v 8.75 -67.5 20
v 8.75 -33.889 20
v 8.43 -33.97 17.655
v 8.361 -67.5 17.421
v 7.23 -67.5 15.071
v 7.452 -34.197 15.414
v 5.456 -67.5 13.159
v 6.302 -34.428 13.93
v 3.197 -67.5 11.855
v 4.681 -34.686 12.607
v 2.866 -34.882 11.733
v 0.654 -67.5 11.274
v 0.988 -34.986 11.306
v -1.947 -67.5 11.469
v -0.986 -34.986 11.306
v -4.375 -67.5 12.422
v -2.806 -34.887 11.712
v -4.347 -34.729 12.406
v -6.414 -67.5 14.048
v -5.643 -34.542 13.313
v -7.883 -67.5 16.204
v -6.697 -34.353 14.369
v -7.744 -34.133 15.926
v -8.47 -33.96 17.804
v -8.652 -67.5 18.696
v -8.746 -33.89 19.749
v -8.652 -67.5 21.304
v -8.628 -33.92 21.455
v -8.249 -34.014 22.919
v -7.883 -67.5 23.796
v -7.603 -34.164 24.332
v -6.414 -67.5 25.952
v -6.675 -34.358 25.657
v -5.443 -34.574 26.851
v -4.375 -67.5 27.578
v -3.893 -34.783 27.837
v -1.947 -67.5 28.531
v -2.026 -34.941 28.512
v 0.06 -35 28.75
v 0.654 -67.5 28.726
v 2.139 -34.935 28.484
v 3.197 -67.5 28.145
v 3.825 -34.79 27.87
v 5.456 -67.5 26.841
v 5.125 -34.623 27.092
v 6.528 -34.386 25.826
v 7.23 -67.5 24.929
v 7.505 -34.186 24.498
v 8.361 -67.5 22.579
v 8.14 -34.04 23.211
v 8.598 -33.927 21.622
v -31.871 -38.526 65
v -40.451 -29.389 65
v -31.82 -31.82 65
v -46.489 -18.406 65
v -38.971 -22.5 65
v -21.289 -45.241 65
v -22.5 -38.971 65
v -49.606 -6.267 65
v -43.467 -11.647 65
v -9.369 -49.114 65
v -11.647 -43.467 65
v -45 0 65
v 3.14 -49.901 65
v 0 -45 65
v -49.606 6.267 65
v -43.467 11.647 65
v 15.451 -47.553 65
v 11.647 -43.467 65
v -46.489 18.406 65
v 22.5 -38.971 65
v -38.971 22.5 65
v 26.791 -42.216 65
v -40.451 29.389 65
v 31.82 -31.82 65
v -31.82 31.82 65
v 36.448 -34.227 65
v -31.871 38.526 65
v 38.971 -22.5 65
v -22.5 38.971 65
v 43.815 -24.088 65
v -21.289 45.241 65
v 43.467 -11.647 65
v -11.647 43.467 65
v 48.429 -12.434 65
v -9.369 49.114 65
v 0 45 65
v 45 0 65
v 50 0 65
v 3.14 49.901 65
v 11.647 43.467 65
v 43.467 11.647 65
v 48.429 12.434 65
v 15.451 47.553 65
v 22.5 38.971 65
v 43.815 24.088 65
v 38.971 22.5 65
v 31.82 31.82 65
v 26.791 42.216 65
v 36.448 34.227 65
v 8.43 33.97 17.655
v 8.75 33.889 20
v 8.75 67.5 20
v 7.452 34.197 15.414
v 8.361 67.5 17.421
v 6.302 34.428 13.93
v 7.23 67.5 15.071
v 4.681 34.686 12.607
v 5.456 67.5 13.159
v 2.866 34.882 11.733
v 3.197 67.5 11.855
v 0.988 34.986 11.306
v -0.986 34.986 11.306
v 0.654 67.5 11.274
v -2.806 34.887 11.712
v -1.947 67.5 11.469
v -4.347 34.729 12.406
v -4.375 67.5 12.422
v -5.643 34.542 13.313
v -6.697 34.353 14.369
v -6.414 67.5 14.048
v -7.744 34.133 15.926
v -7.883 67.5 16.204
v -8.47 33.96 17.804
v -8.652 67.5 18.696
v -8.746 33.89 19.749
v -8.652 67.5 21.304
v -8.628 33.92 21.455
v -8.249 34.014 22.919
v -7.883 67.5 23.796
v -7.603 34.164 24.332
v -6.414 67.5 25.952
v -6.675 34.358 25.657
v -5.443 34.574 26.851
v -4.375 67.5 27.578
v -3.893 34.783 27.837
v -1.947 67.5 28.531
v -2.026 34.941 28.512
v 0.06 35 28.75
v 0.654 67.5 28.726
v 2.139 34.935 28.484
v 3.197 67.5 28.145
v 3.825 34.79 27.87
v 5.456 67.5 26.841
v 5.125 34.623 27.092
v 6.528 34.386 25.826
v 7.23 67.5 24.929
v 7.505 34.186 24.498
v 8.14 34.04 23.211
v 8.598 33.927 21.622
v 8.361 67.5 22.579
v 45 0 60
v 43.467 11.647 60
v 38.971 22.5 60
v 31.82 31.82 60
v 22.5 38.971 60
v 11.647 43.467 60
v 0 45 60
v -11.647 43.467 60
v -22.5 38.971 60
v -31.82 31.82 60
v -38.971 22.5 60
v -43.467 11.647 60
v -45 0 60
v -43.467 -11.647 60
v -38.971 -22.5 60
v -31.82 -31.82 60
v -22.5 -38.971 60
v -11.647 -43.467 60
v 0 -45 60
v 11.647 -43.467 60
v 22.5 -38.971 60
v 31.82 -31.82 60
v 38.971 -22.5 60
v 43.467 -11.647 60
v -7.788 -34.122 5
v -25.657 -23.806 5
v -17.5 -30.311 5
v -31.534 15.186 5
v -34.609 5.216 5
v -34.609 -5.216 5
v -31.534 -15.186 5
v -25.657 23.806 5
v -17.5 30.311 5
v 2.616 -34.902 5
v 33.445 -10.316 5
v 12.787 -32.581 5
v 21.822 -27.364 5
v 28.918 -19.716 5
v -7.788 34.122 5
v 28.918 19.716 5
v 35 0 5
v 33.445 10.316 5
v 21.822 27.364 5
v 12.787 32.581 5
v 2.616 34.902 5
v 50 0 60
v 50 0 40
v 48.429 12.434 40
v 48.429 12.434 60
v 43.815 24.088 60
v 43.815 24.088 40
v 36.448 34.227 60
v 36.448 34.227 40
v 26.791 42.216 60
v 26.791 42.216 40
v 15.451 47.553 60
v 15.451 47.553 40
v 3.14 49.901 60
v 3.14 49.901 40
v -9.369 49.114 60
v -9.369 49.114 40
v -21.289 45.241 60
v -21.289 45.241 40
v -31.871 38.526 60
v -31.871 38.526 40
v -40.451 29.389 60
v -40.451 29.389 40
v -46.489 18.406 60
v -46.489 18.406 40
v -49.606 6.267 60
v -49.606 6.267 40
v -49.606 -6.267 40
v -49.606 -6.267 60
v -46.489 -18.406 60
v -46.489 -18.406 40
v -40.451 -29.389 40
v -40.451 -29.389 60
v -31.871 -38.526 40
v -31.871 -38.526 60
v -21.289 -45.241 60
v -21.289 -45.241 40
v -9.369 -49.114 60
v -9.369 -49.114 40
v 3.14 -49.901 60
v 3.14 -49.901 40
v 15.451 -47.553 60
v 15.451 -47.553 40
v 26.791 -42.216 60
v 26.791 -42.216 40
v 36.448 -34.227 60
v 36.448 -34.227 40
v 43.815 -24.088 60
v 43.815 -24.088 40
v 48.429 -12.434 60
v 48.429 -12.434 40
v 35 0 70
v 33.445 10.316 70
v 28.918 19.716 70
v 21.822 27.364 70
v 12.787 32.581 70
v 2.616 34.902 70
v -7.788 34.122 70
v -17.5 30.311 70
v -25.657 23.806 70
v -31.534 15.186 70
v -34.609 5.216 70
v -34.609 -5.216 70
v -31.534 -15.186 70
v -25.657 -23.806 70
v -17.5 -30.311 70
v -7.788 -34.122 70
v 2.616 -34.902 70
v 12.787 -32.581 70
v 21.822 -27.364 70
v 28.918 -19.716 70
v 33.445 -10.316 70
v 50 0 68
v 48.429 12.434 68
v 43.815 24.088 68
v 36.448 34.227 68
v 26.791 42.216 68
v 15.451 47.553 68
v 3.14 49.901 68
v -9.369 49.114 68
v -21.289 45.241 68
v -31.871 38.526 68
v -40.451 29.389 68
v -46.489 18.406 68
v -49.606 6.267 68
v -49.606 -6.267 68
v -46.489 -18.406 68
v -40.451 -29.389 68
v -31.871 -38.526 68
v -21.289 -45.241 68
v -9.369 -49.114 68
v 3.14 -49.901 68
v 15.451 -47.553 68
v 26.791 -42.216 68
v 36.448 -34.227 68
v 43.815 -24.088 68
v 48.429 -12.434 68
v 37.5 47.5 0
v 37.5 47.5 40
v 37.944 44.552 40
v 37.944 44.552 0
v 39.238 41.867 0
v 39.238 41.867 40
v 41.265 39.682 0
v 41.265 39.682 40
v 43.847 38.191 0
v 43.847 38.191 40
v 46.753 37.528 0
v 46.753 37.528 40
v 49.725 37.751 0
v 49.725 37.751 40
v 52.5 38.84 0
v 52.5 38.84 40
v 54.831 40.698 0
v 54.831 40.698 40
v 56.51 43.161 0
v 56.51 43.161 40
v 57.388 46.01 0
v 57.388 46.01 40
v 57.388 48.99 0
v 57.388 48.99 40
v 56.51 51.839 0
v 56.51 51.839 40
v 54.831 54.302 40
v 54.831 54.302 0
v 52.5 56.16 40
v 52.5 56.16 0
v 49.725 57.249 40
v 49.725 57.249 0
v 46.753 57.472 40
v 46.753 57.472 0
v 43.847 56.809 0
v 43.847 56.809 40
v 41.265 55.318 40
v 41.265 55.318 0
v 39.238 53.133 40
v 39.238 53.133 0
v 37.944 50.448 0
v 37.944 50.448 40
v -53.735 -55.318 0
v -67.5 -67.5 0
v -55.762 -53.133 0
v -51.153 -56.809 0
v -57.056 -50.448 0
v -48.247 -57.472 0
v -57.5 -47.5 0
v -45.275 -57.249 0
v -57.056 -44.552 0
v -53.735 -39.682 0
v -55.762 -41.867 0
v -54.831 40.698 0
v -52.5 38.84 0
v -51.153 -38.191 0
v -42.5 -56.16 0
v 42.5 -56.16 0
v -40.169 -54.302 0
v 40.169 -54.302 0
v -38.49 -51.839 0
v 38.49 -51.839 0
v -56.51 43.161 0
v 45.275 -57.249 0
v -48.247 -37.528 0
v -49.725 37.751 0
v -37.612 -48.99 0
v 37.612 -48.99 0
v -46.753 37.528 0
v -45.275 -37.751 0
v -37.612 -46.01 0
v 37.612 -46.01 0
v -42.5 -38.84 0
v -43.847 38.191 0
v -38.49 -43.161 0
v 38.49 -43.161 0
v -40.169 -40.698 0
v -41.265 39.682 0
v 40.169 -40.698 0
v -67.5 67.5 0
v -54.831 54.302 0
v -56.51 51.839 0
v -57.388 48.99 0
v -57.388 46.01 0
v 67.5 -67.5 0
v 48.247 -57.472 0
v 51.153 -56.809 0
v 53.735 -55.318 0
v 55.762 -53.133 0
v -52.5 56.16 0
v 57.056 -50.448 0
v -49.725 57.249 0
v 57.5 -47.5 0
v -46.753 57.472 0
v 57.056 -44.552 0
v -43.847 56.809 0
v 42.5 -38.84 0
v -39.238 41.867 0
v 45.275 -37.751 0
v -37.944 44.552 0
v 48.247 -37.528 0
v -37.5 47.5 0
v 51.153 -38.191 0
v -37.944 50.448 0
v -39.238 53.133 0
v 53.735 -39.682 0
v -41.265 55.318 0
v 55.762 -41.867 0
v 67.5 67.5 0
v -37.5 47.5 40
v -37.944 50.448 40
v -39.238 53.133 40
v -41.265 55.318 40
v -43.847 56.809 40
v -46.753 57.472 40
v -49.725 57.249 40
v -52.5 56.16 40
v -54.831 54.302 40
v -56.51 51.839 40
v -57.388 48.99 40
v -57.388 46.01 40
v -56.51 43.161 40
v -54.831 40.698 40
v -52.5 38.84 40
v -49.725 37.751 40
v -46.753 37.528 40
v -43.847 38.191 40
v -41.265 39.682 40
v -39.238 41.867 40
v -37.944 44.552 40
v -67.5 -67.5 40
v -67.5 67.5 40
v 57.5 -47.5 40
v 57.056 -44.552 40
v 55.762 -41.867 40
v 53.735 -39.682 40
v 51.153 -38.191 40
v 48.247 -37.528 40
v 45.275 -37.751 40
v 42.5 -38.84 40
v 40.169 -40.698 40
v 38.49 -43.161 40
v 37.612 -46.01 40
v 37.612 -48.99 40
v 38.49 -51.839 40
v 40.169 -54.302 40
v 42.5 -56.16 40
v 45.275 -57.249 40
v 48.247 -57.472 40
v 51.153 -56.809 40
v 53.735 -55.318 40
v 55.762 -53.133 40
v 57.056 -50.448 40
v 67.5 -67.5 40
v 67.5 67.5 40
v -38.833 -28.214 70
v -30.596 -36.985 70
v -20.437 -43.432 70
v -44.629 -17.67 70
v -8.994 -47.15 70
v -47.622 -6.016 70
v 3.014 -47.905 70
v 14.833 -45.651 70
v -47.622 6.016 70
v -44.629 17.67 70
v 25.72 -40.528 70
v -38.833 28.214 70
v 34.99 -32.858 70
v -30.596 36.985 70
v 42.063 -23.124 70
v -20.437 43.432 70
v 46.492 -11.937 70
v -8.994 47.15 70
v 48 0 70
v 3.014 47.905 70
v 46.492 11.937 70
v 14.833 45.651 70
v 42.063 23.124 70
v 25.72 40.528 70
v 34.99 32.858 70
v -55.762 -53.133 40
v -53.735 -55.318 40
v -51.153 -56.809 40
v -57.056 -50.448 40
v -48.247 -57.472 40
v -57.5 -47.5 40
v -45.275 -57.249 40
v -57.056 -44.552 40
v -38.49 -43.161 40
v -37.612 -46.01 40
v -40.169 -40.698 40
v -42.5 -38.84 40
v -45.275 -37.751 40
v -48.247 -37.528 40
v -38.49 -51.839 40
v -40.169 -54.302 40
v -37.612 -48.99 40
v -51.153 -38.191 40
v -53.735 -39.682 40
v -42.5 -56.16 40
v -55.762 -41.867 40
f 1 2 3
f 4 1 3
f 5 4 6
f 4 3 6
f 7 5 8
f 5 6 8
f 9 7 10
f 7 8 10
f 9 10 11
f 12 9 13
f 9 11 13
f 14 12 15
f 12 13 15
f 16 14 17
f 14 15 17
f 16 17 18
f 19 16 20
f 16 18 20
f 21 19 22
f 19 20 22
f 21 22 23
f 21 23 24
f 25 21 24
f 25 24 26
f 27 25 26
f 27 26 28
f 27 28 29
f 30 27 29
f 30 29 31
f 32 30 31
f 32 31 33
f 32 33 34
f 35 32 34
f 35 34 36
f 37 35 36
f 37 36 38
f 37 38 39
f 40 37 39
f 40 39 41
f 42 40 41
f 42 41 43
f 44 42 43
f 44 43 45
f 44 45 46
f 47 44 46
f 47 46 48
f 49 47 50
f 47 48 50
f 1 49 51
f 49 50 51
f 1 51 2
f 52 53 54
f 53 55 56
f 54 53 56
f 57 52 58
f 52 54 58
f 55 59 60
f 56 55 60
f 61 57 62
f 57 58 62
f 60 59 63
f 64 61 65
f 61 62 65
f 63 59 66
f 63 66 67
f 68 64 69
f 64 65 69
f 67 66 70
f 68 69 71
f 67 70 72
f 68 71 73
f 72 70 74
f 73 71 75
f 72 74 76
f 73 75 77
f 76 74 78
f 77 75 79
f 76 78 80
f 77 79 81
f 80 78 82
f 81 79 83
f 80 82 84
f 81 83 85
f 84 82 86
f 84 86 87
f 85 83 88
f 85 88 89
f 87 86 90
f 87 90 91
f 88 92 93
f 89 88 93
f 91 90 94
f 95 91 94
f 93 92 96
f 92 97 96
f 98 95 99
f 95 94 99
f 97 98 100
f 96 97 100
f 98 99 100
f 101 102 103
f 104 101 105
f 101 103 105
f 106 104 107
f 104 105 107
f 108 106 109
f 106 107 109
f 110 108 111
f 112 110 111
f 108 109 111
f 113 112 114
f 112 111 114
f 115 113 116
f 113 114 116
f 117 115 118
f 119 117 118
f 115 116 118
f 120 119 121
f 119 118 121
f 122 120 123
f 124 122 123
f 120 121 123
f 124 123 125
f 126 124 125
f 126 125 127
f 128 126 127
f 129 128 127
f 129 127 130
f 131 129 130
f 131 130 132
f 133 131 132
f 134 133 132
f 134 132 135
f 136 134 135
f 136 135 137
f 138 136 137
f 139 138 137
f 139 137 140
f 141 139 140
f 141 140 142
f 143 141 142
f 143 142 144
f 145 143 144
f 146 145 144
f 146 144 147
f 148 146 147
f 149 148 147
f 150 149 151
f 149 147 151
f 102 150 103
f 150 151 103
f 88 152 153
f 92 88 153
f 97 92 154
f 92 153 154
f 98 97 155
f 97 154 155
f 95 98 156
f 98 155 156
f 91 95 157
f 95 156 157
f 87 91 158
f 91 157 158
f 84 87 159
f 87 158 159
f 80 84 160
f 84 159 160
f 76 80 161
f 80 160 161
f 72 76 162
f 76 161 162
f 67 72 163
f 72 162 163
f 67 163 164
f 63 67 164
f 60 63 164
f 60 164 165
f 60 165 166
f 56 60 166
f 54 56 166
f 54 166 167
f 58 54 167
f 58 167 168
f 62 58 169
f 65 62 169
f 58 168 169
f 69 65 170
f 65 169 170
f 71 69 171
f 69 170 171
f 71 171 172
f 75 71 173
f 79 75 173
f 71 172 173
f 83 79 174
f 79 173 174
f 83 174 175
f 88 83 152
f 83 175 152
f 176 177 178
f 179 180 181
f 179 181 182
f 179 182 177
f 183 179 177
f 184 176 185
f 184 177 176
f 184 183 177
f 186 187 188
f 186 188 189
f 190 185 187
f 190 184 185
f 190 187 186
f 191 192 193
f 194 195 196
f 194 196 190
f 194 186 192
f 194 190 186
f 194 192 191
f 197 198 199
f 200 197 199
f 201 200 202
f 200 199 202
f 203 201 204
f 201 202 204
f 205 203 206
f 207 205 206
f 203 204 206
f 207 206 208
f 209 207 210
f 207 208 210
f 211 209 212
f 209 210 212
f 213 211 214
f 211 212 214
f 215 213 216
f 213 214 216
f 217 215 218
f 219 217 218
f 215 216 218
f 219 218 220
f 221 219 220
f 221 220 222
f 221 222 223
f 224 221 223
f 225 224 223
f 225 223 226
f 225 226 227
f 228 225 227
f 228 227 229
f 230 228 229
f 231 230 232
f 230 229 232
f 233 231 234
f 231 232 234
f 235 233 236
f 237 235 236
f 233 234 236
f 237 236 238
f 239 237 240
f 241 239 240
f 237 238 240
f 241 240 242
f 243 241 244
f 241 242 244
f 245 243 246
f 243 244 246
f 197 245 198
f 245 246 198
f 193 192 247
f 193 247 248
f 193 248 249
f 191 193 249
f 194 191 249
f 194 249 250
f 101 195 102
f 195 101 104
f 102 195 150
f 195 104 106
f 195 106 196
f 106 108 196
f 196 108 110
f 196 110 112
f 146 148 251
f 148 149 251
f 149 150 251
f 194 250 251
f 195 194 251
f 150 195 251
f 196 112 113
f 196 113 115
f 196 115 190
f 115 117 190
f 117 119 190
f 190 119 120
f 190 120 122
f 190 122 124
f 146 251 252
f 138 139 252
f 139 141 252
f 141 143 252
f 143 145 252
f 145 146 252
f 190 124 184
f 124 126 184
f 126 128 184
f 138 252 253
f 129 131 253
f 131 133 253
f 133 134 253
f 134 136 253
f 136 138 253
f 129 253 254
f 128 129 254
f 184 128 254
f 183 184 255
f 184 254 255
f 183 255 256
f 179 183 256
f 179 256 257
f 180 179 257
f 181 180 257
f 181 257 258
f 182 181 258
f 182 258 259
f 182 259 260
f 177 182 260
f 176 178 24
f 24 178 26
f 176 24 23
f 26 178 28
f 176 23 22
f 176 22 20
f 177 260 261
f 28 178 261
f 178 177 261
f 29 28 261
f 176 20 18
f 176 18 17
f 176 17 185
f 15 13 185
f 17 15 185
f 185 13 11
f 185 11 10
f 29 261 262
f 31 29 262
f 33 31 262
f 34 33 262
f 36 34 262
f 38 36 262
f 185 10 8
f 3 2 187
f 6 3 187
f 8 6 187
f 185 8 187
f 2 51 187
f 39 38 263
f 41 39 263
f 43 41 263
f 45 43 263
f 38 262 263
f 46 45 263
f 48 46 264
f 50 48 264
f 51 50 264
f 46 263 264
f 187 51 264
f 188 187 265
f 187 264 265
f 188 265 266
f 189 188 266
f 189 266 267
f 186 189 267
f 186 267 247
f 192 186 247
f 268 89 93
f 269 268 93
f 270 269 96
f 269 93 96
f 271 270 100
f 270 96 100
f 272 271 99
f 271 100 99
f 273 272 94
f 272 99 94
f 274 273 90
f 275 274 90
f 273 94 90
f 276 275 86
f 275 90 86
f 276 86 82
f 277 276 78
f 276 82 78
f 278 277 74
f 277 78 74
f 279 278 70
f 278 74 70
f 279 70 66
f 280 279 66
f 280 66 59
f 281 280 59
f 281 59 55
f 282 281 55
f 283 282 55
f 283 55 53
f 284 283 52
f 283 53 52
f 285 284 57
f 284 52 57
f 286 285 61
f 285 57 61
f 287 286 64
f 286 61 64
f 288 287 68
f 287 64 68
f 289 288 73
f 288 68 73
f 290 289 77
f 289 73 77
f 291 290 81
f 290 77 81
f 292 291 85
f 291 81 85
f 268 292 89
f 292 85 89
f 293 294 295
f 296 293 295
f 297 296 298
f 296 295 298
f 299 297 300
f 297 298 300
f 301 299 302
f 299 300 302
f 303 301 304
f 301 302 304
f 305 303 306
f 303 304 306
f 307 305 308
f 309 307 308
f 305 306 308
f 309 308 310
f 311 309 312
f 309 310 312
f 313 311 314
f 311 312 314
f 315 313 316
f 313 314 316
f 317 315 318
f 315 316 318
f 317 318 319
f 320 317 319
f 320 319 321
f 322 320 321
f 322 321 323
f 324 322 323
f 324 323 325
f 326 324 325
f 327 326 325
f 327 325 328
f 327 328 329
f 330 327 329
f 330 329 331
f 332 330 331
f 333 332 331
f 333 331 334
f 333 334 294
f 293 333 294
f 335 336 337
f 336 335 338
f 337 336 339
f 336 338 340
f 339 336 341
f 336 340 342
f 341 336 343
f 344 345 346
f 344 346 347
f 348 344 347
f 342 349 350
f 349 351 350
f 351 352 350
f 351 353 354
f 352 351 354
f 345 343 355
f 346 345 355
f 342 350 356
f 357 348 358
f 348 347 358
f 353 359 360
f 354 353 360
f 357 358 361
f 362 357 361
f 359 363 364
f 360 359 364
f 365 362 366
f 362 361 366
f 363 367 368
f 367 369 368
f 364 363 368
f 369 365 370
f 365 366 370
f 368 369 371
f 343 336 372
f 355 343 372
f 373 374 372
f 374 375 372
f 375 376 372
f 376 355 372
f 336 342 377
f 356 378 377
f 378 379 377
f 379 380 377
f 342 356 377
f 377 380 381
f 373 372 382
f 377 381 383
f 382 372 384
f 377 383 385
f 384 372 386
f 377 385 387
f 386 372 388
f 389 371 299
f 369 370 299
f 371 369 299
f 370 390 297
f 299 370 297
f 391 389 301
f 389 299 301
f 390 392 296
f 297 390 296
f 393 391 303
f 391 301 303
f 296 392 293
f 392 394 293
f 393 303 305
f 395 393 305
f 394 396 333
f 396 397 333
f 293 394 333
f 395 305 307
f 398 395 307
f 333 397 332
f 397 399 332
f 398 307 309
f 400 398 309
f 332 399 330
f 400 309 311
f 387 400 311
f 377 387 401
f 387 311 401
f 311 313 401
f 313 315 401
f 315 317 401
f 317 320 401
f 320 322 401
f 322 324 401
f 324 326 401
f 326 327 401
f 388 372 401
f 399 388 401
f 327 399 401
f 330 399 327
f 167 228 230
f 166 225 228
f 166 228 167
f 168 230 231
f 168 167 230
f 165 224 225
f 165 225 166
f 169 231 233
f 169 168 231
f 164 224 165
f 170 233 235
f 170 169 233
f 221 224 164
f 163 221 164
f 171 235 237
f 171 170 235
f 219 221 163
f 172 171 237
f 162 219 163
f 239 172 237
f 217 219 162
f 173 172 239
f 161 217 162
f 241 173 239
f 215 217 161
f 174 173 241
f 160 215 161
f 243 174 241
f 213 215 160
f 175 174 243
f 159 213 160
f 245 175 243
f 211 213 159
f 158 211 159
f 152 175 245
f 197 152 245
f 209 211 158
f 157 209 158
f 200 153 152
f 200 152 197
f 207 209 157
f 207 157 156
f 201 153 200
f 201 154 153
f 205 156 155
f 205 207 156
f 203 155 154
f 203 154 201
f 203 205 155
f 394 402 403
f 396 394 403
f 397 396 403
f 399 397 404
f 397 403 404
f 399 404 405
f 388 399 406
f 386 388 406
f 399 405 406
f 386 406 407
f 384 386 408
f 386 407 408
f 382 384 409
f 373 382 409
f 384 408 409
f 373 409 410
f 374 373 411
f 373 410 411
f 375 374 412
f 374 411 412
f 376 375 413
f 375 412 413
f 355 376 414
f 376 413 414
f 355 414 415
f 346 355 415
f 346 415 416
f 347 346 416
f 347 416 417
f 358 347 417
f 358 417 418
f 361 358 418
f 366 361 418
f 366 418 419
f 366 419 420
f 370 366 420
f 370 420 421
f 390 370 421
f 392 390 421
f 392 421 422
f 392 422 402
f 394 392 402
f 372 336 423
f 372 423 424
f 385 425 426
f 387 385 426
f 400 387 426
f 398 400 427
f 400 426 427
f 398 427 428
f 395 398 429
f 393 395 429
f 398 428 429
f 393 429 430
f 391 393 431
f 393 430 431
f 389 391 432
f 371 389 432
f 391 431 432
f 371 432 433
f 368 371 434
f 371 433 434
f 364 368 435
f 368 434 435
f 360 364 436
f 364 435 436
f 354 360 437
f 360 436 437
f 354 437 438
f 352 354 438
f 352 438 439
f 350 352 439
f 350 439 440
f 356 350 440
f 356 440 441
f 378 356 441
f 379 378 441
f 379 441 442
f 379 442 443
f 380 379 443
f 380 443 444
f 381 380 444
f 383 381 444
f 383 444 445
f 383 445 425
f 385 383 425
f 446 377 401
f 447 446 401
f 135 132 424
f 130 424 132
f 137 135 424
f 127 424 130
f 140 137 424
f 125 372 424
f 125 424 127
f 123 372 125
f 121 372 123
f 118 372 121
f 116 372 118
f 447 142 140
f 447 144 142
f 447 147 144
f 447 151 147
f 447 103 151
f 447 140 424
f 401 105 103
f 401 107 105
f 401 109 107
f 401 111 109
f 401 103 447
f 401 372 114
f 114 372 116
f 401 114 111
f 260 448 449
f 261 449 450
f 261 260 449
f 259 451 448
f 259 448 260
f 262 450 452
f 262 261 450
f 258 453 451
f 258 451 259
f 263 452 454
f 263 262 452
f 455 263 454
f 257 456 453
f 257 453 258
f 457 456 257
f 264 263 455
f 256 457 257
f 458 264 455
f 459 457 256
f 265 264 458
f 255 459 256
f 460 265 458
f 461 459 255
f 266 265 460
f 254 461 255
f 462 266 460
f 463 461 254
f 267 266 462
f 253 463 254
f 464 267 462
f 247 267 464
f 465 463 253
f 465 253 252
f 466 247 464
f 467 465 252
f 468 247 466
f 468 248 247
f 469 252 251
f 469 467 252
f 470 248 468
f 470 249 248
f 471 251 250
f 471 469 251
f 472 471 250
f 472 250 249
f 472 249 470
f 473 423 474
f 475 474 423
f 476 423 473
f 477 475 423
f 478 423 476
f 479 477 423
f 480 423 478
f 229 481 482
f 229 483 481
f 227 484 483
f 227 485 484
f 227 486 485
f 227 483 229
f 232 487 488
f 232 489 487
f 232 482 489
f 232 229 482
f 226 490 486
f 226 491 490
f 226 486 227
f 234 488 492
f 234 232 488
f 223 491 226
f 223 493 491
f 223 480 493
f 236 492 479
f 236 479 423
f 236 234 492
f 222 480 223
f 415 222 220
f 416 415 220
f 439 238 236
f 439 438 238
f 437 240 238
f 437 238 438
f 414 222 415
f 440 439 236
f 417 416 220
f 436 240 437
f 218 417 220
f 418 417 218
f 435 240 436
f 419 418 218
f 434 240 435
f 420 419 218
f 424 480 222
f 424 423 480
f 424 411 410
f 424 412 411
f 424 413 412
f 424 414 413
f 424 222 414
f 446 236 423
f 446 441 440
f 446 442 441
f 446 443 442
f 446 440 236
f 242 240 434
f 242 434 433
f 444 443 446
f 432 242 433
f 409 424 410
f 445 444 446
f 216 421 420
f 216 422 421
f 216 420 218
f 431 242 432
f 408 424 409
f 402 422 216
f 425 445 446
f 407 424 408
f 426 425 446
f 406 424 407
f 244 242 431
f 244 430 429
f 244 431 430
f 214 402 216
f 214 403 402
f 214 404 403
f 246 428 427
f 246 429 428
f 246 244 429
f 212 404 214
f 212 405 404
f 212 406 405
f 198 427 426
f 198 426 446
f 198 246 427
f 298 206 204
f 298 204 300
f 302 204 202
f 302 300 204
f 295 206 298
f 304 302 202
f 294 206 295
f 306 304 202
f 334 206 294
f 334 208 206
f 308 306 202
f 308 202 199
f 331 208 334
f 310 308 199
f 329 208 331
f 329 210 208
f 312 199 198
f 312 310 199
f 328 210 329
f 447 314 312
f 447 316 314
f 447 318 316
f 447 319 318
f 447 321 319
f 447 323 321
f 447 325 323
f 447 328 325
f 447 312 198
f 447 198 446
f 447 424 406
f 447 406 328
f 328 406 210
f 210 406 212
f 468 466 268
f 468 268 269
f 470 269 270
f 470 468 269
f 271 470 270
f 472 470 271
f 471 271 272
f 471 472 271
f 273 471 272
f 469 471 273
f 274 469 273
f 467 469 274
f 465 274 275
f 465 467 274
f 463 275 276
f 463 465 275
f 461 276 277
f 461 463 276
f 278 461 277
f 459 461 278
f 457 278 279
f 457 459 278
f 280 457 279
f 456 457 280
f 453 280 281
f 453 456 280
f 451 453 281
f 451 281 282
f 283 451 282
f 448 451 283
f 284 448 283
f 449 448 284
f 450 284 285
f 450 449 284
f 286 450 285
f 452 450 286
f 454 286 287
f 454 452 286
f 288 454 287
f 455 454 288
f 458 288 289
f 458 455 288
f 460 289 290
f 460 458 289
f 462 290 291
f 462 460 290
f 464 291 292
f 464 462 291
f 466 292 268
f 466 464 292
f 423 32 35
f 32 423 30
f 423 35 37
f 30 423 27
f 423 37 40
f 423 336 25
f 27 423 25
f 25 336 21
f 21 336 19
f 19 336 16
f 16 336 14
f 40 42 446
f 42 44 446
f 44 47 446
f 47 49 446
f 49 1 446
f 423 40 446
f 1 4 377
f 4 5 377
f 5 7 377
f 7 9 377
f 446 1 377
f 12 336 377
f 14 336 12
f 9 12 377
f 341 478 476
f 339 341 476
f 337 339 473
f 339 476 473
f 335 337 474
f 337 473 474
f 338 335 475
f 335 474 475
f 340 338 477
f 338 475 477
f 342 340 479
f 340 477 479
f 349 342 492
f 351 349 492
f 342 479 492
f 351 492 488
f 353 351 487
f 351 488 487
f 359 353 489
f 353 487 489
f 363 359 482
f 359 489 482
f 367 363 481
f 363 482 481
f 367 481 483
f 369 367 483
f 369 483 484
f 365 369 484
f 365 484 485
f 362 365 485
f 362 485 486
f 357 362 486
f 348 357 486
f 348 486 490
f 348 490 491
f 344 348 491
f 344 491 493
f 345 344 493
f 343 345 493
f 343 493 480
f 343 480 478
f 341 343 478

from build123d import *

# Parameters (mm, degrees)
SKETCH1_W              = 135
SKETCH1_H              = 135
BOSS_EXTRUDE1_DEPTH    = 40
SKETCH2_R              = 10
CUT_EXTRUDE1_DEPTH     = 104.501207722
SKETCH4_R              = 50
BOSS_EXTRUDE2_DEPTH    = 20
SKETCH5_R              = 45
BOSS_EXTRUDE3_DEPTH    = 5
SKETCH6_R              = 50
BOSS_EXTRUDE4_DEPTH    = 5
CHAMFER1_SIZE          = 2
SKETCH7_R              = 35
CUT_EXTRUDE2_DEPTH     = 65
M20X2_5_TAPPED_HOLE1_D = 17.5


with BuildPart() as part:
    # Sketch1 → Boss-Extrude1 (new body)
    with BuildSketch(Plane.XY):
        Rectangle(SKETCH1_W, SKETCH1_H)
    extrude(amount=BOSS_EXTRUDE1_DEPTH)

    # Sketch2 → Cut-Extrude1 (cut, through all)
    with BuildSketch(Plane.XY.offset(40)):
        with Locations((-47.5, 47.5)):
            Circle(SKETCH2_R)
        with Locations(Location((47.5, 47.5, 0), (0, 0, 180))):
            Circle(SKETCH2_R)
        with Locations((47.5, -47.5)):
            Circle(SKETCH2_R)
        with Locations(Location((-47.5, -47.5, 0), (0, 0, 180))):
            Circle(SKETCH2_R)
    extrude(amount=-CUT_EXTRUDE1_DEPTH, mode=Mode.SUBTRACT)

    # Sketch4 → Boss-Extrude2 (add)
    with BuildSketch(Plane.XY.offset(40)):
        Circle(SKETCH4_R)
    extrude(amount=BOSS_EXTRUDE2_DEPTH)

    # Sketch5 → Boss-Extrude3 (add)
    with BuildSketch(Plane.XY.offset(60)):
        Circle(SKETCH5_R)
    extrude(amount=BOSS_EXTRUDE3_DEPTH)

    # Sketch6 → Boss-Extrude4 (add)
    with BuildSketch(Plane.XY.offset(65)):
        Circle(SKETCH6_R)
    extrude(amount=BOSS_EXTRUDE4_DEPTH)

    # Chamfer1
    chamfer1_edges = [part.edges().sort_by_distance(p)[0] for p in [
        (-50, 0, 70),
    ]]
    chamfer(chamfer1_edges, length=CHAMFER1_SIZE)

    # Sketch7 → Cut-Extrude2 (cut)
    with BuildSketch(Plane.XY.offset(70)):
        Circle(SKETCH7_R)
    extrude(amount=-CUT_EXTRUDE2_DEPTH, mode=Mode.SUBTRACT)

    # M20x2.5 Tapped Hole1 (through all)
    with Locations(Plane(origin=(0, -67.5, 20), x_dir=(-1, 0, 0), z_dir=(0, -1, 0))):
        with Locations((0, 0)):
            Hole(M20X2_5_TAPPED_HOLE1_D / 2)


solid = part.part
